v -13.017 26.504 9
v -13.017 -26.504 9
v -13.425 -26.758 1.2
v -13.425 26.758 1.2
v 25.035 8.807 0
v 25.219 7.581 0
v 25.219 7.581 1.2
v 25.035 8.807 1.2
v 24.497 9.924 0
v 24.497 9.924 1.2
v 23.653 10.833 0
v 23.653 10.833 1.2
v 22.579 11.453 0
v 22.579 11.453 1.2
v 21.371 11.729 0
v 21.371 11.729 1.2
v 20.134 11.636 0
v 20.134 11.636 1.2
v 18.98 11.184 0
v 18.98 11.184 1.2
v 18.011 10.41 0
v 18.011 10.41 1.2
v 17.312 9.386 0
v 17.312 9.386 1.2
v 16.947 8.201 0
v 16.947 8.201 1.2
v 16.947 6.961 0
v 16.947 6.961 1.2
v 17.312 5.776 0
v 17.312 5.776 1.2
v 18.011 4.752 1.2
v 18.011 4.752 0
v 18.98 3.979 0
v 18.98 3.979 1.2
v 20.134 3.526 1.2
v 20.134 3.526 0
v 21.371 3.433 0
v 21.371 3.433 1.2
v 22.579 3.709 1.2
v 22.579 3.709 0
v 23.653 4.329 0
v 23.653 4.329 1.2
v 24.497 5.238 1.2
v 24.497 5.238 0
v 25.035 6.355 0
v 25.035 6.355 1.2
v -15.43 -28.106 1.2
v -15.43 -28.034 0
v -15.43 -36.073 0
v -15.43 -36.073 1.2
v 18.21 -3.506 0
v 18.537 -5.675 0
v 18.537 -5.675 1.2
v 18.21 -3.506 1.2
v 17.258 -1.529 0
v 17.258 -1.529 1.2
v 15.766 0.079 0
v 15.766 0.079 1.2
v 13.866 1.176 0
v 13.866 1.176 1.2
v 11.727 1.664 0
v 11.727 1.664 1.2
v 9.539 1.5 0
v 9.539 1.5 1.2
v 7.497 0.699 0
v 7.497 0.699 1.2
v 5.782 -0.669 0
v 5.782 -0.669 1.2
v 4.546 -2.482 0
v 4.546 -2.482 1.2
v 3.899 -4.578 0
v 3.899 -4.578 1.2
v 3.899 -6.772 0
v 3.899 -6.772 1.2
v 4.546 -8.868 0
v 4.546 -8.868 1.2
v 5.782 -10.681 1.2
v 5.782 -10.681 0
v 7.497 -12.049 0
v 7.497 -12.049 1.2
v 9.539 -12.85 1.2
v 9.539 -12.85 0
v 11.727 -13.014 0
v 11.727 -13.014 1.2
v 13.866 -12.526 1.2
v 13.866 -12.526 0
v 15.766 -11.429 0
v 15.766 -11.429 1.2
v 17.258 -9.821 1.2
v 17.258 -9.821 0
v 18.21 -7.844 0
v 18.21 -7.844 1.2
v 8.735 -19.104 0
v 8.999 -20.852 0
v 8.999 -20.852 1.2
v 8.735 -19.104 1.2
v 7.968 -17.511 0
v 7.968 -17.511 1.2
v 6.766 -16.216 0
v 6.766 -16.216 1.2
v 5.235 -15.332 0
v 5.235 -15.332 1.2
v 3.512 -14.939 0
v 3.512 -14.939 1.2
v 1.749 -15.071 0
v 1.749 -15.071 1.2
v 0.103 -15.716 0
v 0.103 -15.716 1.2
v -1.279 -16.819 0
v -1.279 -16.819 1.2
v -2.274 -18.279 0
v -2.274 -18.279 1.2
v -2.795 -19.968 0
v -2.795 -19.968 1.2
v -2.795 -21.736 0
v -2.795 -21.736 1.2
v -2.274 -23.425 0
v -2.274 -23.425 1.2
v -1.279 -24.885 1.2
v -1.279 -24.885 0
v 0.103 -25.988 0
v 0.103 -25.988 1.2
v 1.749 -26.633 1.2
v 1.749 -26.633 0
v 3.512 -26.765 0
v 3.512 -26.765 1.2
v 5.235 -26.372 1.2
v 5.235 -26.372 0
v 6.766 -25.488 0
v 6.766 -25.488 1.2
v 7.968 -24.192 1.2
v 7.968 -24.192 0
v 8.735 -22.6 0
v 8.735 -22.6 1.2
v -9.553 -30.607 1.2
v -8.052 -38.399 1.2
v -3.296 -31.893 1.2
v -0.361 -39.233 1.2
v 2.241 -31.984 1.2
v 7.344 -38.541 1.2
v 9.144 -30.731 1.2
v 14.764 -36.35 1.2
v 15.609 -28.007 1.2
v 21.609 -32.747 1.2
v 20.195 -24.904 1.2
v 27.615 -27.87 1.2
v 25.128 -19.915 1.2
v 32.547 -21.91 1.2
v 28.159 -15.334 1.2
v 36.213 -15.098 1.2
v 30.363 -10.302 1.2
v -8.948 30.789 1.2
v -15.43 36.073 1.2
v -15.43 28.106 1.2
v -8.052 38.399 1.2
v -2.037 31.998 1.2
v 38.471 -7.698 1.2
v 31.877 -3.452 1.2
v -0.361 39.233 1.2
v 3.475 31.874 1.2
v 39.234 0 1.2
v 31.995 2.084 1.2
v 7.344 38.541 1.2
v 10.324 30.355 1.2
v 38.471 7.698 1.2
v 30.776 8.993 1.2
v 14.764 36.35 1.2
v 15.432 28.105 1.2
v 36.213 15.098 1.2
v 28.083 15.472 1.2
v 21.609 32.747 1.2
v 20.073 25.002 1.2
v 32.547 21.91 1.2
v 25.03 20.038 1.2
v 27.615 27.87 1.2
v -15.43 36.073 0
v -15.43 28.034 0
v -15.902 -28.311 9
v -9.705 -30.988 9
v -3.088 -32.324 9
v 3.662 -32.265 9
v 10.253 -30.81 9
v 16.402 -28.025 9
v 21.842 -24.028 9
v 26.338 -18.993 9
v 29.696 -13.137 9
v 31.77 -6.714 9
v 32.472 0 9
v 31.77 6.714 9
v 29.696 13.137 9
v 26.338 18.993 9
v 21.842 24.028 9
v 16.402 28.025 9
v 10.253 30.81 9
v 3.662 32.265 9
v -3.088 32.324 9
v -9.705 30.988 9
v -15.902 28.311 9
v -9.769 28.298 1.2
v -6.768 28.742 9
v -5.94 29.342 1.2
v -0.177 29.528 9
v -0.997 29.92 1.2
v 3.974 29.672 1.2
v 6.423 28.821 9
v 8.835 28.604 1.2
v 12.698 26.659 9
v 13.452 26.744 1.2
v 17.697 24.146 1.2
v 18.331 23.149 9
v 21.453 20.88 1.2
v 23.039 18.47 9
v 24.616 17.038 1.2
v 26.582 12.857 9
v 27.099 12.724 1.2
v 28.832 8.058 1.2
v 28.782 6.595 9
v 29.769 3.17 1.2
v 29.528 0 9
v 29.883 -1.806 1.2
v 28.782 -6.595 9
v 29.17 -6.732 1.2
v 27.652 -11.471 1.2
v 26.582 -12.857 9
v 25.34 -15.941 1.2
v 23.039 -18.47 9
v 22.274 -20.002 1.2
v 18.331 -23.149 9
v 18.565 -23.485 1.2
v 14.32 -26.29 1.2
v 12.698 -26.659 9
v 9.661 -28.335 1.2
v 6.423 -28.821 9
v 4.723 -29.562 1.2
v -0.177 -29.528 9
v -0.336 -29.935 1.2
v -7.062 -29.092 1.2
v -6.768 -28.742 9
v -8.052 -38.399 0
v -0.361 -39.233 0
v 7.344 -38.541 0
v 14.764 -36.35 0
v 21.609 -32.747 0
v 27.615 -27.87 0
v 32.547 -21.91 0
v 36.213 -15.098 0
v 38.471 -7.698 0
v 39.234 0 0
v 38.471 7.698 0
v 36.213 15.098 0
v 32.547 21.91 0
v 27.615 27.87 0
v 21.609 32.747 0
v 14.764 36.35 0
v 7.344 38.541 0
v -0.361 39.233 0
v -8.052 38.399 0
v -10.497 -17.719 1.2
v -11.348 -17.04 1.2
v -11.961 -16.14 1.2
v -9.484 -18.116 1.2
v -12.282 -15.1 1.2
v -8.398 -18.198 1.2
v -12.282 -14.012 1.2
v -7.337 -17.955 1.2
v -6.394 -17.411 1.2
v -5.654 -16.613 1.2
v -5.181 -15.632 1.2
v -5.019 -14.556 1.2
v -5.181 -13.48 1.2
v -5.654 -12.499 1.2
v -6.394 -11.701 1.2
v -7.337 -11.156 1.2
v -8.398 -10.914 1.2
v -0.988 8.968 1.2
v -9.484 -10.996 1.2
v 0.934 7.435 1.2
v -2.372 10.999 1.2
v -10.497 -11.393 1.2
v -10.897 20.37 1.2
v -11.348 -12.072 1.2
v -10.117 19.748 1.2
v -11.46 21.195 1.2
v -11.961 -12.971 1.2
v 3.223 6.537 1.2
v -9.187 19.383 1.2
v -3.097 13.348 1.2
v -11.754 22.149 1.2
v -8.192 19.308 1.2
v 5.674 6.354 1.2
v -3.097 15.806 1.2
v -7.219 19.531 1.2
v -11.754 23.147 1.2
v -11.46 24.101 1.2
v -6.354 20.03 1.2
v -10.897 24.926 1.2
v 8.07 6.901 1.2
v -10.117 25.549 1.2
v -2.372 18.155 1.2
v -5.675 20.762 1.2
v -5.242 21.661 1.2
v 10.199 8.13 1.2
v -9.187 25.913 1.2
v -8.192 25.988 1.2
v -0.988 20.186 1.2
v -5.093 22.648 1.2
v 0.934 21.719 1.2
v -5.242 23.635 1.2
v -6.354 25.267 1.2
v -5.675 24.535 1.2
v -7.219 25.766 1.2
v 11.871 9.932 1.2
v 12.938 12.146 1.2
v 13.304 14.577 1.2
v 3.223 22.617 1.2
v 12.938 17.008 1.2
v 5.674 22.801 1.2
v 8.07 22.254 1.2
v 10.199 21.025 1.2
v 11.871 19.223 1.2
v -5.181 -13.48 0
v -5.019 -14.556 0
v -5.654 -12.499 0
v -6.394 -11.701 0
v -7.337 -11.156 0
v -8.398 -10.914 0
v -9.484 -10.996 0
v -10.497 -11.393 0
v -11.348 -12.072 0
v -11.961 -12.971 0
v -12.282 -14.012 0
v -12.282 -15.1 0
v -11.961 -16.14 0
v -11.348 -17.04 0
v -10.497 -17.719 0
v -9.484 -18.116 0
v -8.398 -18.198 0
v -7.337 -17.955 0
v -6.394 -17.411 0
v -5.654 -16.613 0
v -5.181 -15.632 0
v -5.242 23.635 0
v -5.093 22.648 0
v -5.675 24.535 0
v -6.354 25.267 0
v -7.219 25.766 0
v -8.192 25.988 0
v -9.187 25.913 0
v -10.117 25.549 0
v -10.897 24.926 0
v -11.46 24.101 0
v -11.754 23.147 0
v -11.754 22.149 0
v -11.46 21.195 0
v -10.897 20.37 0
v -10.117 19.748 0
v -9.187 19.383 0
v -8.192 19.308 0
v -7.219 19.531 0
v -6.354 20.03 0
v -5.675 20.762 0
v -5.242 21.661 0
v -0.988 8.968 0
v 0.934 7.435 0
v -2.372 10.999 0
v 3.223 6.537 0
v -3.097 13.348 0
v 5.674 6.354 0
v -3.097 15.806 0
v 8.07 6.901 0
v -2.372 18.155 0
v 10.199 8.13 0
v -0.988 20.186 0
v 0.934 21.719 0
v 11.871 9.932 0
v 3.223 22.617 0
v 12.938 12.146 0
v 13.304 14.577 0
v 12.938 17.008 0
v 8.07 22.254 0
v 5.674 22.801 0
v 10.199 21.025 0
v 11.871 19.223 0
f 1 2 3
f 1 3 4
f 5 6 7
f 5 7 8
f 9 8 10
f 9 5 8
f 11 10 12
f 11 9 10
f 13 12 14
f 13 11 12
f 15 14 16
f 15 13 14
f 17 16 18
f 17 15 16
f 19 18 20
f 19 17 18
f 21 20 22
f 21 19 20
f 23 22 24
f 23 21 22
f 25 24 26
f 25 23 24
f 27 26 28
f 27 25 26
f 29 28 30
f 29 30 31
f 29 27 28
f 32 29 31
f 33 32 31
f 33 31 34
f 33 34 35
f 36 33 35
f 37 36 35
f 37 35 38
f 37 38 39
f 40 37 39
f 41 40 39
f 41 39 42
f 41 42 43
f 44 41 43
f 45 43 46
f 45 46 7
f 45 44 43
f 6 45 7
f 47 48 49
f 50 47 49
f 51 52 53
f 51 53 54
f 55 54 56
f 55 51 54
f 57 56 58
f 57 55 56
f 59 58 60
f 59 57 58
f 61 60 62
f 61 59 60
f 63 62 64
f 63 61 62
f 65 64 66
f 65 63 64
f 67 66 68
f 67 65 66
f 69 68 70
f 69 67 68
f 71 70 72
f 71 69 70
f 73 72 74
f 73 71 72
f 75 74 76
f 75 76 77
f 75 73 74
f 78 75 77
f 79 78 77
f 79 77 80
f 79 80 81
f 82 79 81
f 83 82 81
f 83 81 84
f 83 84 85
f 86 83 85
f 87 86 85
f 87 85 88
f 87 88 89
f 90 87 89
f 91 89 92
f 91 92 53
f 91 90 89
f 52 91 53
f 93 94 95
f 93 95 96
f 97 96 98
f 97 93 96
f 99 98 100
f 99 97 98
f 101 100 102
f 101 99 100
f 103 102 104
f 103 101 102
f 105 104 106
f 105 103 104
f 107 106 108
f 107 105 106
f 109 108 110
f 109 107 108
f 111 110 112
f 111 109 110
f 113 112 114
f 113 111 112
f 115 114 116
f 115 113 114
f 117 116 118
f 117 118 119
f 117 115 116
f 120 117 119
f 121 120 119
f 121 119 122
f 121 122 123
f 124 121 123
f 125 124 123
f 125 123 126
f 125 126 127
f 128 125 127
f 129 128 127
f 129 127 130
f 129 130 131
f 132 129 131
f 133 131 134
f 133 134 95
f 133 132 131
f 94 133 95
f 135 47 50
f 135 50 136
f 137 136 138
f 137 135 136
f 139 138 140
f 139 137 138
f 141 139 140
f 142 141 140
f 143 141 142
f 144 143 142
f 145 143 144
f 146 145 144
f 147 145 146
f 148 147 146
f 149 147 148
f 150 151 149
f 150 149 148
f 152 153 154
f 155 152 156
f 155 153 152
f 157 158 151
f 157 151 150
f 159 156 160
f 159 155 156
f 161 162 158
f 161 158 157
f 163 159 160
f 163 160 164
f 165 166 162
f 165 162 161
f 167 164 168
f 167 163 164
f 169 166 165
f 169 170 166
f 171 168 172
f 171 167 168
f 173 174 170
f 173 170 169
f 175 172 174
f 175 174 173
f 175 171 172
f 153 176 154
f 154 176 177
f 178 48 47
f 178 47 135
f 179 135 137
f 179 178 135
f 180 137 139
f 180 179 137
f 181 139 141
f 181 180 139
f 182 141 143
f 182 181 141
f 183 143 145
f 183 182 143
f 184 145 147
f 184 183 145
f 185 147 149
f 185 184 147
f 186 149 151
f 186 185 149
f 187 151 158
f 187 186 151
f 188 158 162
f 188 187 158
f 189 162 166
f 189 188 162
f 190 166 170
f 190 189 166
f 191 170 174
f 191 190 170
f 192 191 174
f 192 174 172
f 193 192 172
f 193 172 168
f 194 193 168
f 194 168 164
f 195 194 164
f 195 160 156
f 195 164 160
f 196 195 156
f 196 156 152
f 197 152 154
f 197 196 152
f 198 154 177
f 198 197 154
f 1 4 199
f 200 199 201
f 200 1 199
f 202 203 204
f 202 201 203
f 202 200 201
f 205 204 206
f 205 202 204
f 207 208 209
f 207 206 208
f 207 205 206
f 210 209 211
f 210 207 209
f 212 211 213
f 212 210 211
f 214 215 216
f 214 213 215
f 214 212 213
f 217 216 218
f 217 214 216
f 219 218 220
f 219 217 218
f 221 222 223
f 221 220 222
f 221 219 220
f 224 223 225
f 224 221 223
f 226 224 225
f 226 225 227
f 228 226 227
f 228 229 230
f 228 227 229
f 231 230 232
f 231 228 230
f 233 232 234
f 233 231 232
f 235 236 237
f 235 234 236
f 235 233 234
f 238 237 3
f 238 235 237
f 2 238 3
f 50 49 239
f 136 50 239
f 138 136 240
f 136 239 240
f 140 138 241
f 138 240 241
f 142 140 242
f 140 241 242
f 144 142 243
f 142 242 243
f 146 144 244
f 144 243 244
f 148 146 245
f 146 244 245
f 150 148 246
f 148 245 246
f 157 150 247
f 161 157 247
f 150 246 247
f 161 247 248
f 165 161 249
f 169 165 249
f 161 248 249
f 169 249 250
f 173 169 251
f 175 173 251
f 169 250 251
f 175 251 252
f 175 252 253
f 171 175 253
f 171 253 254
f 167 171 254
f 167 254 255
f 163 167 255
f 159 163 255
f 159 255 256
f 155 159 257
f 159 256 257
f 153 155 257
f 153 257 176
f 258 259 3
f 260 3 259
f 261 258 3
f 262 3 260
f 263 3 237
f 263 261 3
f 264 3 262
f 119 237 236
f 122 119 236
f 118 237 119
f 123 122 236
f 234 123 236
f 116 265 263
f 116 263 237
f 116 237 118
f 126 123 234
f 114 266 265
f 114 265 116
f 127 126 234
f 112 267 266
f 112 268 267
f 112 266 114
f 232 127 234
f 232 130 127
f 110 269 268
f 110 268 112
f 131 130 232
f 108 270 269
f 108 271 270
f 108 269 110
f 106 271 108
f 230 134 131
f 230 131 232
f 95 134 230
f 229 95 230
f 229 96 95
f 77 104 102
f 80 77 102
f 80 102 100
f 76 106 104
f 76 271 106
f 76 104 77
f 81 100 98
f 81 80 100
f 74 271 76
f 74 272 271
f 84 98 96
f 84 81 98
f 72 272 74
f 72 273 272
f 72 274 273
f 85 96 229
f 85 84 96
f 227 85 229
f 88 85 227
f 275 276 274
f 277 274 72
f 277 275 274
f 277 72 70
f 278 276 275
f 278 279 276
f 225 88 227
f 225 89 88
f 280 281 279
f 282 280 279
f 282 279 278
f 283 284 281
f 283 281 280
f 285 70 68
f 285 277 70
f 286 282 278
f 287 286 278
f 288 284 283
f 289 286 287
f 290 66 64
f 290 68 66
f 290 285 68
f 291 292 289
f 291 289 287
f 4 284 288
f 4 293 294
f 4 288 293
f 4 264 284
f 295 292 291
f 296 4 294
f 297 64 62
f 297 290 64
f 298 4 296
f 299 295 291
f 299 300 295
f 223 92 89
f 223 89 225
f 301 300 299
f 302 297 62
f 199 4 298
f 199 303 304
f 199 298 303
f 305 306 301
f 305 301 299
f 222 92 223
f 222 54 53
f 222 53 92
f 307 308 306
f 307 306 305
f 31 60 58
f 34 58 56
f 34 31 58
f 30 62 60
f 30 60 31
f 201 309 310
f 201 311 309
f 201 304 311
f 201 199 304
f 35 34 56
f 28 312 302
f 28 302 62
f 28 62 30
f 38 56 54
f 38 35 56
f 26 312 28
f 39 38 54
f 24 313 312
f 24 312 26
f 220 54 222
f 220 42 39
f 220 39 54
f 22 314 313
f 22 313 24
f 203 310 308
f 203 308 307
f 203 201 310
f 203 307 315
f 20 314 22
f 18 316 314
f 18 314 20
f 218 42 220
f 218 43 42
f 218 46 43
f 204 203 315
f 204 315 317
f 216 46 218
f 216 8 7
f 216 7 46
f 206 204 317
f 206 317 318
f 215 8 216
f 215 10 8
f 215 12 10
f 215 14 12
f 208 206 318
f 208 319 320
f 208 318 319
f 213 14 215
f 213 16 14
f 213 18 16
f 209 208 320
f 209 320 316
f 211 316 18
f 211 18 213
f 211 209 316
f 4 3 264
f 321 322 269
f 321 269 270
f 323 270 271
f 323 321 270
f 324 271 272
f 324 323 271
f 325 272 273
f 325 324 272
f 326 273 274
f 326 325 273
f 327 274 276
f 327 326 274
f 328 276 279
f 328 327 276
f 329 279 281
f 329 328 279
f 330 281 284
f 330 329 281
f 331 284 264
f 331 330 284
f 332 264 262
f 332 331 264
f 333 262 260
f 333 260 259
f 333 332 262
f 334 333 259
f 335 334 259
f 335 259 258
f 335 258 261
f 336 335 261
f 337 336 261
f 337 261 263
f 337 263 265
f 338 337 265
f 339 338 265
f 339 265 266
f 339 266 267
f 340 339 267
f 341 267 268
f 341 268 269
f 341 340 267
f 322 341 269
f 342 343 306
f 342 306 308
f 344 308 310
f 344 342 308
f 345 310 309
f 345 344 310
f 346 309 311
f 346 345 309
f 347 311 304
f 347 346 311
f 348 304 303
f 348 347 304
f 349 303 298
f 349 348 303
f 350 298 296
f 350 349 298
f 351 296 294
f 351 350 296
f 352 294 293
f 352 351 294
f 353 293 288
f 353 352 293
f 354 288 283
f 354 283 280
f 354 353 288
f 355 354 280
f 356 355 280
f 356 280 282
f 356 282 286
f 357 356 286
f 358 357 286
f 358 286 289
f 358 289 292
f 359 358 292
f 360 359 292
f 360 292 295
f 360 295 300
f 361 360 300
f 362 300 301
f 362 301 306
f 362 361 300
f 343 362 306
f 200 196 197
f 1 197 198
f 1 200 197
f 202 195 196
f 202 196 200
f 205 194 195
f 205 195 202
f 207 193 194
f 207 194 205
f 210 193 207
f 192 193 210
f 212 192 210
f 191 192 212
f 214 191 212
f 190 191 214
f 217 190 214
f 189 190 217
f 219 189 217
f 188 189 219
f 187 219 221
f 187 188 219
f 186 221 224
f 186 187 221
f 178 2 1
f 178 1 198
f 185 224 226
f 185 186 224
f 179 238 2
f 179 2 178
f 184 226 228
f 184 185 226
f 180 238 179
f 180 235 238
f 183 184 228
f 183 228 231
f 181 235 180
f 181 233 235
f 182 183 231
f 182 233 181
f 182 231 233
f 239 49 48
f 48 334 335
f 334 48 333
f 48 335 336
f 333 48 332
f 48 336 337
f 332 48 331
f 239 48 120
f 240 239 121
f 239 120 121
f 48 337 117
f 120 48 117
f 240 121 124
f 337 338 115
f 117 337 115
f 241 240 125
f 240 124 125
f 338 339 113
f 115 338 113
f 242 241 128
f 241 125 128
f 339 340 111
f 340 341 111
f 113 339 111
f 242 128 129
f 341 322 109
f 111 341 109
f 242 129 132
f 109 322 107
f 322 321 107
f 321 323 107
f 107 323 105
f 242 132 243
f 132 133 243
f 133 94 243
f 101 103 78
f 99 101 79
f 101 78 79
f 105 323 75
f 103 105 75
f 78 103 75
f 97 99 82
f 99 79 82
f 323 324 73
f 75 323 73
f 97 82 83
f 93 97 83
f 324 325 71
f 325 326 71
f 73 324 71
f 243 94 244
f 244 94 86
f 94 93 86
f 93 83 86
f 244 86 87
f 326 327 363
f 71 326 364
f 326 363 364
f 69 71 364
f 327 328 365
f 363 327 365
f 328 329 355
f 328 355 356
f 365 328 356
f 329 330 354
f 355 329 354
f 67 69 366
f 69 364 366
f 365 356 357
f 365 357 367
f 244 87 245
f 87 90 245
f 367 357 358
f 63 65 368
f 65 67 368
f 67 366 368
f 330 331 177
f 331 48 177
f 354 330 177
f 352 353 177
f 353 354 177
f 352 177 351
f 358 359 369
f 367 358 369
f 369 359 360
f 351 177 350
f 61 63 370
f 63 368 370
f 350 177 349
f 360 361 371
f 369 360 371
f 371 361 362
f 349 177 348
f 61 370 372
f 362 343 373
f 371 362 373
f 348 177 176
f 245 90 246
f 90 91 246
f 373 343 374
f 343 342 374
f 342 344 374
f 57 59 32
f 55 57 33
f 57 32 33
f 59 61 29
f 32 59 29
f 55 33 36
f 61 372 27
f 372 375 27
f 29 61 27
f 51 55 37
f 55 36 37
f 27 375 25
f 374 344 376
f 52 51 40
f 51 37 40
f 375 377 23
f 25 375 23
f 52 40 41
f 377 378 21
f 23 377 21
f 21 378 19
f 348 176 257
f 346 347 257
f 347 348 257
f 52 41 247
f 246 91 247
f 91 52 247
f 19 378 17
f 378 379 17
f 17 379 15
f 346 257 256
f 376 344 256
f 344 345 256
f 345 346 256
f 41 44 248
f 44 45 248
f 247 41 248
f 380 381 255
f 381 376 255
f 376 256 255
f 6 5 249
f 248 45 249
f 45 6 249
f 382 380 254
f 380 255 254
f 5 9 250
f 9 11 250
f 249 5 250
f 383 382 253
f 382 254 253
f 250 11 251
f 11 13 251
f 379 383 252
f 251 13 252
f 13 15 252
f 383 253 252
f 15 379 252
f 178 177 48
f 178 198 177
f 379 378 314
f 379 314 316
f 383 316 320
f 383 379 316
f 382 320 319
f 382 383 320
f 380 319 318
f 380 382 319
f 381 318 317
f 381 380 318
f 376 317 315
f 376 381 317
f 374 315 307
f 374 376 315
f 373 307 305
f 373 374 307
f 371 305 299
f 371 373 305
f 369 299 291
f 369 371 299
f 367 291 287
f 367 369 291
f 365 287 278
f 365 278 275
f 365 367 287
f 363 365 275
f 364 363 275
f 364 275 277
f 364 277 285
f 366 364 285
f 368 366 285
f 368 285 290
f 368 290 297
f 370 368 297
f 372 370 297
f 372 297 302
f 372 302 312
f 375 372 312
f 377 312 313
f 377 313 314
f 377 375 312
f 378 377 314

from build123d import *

# Parameters (mm, degrees)
F1_DEPTH = 1.2
F2_DEPTH = 9
F2_TAPER = -3
F0_R     = 5.9300474085
F0_R_2   = 3.6519065509
F0_R_3   = 7.3598691172
F0_R_4   = 8.2465917135
F0_R_5   = 3.349100763
F0_R_6   = 4.1595312384
F3_DEPTH = 1.2


with BuildPart() as f1:
    # F0 (on Top) → F1 (new body)
    with BuildSketch(Plane.XY):
        with BuildLine():
            ThreePointArc((-15.4302030614, 28.0340655897), (32, 0), (-15.4302030614, -28.0340655897))
            Line((-15.4302030614, -28.0340655897), (-15.4302030614, -36.0725488648))
            ThreePointArc((-15.4302030614, -36.0725488648), (39.2341681207, 0), (-15.4302030614, 36.0725488648))
            Line((-15.4302030614, 36.0725488648), (-15.4302030614, 28.0340655897))
        make_face()
    extrude(amount=F1_DEPTH)

    # F0 (on Top) → F2 (join)
    with BuildSketch(Plane.XY):
        with BuildLine():
            Line((-15.4302030614, 28.0340655897), (-15.4302030614, -28.0340655897))
            ThreePointArc((-15.4302030614, -28.0340655897), (32, 0), (-15.4302030614, 28.0340655897))
        make_face()
        with BuildLine():
            ThreePointArc((-13.4883891288, 26.7967042509), (30, 0), (-13.4883891288, -26.7967042509))
            Line((-13.4883891288, -26.7967042509), (-13.4883891288, 26.7967042509))
        make_face(mode=Mode.SUBTRACT)
    extrude(amount=F2_DEPTH, taper=F2_TAPER)

    # F0 (on Top) → F3 (join)
    with BuildSketch(Plane.XY):
        with BuildLine():
            Line((-13.4883891288, 26.7967042509), (-13.4883891288, -26.7967042509))
            ThreePointArc((-13.4883891288, -26.7967042509), (30, 0), (-13.4883891288, 26.7967042509))
        make_face()
        with Locations((3.0684988014, -20.8519827574)):
            Circle(F0_R, mode=Mode.SUBTRACT)
        with Locations((-8.6710527539, -14.5559245721)):
            Circle(F0_R_2, mode=Mode.SUBTRACT)
        with Locations((11.1771188676, -5.6749582291)):
            Circle(F0_R_3, mode=Mode.SUBTRACT)
        with Locations((5.0576031208, 14.5771838725)):
            Circle(F0_R_4, mode=Mode.SUBTRACT)
        with Locations((-8.4421690553, 22.6481538266)):
            Circle(F0_R_5, mode=Mode.SUBTRACT)
        with Locations((21.0598167032, 7.5812428258)):
            Circle(F0_R_6, mode=Mode.SUBTRACT)
    extrude(amount=F3_DEPTH)


solid = f1.part
